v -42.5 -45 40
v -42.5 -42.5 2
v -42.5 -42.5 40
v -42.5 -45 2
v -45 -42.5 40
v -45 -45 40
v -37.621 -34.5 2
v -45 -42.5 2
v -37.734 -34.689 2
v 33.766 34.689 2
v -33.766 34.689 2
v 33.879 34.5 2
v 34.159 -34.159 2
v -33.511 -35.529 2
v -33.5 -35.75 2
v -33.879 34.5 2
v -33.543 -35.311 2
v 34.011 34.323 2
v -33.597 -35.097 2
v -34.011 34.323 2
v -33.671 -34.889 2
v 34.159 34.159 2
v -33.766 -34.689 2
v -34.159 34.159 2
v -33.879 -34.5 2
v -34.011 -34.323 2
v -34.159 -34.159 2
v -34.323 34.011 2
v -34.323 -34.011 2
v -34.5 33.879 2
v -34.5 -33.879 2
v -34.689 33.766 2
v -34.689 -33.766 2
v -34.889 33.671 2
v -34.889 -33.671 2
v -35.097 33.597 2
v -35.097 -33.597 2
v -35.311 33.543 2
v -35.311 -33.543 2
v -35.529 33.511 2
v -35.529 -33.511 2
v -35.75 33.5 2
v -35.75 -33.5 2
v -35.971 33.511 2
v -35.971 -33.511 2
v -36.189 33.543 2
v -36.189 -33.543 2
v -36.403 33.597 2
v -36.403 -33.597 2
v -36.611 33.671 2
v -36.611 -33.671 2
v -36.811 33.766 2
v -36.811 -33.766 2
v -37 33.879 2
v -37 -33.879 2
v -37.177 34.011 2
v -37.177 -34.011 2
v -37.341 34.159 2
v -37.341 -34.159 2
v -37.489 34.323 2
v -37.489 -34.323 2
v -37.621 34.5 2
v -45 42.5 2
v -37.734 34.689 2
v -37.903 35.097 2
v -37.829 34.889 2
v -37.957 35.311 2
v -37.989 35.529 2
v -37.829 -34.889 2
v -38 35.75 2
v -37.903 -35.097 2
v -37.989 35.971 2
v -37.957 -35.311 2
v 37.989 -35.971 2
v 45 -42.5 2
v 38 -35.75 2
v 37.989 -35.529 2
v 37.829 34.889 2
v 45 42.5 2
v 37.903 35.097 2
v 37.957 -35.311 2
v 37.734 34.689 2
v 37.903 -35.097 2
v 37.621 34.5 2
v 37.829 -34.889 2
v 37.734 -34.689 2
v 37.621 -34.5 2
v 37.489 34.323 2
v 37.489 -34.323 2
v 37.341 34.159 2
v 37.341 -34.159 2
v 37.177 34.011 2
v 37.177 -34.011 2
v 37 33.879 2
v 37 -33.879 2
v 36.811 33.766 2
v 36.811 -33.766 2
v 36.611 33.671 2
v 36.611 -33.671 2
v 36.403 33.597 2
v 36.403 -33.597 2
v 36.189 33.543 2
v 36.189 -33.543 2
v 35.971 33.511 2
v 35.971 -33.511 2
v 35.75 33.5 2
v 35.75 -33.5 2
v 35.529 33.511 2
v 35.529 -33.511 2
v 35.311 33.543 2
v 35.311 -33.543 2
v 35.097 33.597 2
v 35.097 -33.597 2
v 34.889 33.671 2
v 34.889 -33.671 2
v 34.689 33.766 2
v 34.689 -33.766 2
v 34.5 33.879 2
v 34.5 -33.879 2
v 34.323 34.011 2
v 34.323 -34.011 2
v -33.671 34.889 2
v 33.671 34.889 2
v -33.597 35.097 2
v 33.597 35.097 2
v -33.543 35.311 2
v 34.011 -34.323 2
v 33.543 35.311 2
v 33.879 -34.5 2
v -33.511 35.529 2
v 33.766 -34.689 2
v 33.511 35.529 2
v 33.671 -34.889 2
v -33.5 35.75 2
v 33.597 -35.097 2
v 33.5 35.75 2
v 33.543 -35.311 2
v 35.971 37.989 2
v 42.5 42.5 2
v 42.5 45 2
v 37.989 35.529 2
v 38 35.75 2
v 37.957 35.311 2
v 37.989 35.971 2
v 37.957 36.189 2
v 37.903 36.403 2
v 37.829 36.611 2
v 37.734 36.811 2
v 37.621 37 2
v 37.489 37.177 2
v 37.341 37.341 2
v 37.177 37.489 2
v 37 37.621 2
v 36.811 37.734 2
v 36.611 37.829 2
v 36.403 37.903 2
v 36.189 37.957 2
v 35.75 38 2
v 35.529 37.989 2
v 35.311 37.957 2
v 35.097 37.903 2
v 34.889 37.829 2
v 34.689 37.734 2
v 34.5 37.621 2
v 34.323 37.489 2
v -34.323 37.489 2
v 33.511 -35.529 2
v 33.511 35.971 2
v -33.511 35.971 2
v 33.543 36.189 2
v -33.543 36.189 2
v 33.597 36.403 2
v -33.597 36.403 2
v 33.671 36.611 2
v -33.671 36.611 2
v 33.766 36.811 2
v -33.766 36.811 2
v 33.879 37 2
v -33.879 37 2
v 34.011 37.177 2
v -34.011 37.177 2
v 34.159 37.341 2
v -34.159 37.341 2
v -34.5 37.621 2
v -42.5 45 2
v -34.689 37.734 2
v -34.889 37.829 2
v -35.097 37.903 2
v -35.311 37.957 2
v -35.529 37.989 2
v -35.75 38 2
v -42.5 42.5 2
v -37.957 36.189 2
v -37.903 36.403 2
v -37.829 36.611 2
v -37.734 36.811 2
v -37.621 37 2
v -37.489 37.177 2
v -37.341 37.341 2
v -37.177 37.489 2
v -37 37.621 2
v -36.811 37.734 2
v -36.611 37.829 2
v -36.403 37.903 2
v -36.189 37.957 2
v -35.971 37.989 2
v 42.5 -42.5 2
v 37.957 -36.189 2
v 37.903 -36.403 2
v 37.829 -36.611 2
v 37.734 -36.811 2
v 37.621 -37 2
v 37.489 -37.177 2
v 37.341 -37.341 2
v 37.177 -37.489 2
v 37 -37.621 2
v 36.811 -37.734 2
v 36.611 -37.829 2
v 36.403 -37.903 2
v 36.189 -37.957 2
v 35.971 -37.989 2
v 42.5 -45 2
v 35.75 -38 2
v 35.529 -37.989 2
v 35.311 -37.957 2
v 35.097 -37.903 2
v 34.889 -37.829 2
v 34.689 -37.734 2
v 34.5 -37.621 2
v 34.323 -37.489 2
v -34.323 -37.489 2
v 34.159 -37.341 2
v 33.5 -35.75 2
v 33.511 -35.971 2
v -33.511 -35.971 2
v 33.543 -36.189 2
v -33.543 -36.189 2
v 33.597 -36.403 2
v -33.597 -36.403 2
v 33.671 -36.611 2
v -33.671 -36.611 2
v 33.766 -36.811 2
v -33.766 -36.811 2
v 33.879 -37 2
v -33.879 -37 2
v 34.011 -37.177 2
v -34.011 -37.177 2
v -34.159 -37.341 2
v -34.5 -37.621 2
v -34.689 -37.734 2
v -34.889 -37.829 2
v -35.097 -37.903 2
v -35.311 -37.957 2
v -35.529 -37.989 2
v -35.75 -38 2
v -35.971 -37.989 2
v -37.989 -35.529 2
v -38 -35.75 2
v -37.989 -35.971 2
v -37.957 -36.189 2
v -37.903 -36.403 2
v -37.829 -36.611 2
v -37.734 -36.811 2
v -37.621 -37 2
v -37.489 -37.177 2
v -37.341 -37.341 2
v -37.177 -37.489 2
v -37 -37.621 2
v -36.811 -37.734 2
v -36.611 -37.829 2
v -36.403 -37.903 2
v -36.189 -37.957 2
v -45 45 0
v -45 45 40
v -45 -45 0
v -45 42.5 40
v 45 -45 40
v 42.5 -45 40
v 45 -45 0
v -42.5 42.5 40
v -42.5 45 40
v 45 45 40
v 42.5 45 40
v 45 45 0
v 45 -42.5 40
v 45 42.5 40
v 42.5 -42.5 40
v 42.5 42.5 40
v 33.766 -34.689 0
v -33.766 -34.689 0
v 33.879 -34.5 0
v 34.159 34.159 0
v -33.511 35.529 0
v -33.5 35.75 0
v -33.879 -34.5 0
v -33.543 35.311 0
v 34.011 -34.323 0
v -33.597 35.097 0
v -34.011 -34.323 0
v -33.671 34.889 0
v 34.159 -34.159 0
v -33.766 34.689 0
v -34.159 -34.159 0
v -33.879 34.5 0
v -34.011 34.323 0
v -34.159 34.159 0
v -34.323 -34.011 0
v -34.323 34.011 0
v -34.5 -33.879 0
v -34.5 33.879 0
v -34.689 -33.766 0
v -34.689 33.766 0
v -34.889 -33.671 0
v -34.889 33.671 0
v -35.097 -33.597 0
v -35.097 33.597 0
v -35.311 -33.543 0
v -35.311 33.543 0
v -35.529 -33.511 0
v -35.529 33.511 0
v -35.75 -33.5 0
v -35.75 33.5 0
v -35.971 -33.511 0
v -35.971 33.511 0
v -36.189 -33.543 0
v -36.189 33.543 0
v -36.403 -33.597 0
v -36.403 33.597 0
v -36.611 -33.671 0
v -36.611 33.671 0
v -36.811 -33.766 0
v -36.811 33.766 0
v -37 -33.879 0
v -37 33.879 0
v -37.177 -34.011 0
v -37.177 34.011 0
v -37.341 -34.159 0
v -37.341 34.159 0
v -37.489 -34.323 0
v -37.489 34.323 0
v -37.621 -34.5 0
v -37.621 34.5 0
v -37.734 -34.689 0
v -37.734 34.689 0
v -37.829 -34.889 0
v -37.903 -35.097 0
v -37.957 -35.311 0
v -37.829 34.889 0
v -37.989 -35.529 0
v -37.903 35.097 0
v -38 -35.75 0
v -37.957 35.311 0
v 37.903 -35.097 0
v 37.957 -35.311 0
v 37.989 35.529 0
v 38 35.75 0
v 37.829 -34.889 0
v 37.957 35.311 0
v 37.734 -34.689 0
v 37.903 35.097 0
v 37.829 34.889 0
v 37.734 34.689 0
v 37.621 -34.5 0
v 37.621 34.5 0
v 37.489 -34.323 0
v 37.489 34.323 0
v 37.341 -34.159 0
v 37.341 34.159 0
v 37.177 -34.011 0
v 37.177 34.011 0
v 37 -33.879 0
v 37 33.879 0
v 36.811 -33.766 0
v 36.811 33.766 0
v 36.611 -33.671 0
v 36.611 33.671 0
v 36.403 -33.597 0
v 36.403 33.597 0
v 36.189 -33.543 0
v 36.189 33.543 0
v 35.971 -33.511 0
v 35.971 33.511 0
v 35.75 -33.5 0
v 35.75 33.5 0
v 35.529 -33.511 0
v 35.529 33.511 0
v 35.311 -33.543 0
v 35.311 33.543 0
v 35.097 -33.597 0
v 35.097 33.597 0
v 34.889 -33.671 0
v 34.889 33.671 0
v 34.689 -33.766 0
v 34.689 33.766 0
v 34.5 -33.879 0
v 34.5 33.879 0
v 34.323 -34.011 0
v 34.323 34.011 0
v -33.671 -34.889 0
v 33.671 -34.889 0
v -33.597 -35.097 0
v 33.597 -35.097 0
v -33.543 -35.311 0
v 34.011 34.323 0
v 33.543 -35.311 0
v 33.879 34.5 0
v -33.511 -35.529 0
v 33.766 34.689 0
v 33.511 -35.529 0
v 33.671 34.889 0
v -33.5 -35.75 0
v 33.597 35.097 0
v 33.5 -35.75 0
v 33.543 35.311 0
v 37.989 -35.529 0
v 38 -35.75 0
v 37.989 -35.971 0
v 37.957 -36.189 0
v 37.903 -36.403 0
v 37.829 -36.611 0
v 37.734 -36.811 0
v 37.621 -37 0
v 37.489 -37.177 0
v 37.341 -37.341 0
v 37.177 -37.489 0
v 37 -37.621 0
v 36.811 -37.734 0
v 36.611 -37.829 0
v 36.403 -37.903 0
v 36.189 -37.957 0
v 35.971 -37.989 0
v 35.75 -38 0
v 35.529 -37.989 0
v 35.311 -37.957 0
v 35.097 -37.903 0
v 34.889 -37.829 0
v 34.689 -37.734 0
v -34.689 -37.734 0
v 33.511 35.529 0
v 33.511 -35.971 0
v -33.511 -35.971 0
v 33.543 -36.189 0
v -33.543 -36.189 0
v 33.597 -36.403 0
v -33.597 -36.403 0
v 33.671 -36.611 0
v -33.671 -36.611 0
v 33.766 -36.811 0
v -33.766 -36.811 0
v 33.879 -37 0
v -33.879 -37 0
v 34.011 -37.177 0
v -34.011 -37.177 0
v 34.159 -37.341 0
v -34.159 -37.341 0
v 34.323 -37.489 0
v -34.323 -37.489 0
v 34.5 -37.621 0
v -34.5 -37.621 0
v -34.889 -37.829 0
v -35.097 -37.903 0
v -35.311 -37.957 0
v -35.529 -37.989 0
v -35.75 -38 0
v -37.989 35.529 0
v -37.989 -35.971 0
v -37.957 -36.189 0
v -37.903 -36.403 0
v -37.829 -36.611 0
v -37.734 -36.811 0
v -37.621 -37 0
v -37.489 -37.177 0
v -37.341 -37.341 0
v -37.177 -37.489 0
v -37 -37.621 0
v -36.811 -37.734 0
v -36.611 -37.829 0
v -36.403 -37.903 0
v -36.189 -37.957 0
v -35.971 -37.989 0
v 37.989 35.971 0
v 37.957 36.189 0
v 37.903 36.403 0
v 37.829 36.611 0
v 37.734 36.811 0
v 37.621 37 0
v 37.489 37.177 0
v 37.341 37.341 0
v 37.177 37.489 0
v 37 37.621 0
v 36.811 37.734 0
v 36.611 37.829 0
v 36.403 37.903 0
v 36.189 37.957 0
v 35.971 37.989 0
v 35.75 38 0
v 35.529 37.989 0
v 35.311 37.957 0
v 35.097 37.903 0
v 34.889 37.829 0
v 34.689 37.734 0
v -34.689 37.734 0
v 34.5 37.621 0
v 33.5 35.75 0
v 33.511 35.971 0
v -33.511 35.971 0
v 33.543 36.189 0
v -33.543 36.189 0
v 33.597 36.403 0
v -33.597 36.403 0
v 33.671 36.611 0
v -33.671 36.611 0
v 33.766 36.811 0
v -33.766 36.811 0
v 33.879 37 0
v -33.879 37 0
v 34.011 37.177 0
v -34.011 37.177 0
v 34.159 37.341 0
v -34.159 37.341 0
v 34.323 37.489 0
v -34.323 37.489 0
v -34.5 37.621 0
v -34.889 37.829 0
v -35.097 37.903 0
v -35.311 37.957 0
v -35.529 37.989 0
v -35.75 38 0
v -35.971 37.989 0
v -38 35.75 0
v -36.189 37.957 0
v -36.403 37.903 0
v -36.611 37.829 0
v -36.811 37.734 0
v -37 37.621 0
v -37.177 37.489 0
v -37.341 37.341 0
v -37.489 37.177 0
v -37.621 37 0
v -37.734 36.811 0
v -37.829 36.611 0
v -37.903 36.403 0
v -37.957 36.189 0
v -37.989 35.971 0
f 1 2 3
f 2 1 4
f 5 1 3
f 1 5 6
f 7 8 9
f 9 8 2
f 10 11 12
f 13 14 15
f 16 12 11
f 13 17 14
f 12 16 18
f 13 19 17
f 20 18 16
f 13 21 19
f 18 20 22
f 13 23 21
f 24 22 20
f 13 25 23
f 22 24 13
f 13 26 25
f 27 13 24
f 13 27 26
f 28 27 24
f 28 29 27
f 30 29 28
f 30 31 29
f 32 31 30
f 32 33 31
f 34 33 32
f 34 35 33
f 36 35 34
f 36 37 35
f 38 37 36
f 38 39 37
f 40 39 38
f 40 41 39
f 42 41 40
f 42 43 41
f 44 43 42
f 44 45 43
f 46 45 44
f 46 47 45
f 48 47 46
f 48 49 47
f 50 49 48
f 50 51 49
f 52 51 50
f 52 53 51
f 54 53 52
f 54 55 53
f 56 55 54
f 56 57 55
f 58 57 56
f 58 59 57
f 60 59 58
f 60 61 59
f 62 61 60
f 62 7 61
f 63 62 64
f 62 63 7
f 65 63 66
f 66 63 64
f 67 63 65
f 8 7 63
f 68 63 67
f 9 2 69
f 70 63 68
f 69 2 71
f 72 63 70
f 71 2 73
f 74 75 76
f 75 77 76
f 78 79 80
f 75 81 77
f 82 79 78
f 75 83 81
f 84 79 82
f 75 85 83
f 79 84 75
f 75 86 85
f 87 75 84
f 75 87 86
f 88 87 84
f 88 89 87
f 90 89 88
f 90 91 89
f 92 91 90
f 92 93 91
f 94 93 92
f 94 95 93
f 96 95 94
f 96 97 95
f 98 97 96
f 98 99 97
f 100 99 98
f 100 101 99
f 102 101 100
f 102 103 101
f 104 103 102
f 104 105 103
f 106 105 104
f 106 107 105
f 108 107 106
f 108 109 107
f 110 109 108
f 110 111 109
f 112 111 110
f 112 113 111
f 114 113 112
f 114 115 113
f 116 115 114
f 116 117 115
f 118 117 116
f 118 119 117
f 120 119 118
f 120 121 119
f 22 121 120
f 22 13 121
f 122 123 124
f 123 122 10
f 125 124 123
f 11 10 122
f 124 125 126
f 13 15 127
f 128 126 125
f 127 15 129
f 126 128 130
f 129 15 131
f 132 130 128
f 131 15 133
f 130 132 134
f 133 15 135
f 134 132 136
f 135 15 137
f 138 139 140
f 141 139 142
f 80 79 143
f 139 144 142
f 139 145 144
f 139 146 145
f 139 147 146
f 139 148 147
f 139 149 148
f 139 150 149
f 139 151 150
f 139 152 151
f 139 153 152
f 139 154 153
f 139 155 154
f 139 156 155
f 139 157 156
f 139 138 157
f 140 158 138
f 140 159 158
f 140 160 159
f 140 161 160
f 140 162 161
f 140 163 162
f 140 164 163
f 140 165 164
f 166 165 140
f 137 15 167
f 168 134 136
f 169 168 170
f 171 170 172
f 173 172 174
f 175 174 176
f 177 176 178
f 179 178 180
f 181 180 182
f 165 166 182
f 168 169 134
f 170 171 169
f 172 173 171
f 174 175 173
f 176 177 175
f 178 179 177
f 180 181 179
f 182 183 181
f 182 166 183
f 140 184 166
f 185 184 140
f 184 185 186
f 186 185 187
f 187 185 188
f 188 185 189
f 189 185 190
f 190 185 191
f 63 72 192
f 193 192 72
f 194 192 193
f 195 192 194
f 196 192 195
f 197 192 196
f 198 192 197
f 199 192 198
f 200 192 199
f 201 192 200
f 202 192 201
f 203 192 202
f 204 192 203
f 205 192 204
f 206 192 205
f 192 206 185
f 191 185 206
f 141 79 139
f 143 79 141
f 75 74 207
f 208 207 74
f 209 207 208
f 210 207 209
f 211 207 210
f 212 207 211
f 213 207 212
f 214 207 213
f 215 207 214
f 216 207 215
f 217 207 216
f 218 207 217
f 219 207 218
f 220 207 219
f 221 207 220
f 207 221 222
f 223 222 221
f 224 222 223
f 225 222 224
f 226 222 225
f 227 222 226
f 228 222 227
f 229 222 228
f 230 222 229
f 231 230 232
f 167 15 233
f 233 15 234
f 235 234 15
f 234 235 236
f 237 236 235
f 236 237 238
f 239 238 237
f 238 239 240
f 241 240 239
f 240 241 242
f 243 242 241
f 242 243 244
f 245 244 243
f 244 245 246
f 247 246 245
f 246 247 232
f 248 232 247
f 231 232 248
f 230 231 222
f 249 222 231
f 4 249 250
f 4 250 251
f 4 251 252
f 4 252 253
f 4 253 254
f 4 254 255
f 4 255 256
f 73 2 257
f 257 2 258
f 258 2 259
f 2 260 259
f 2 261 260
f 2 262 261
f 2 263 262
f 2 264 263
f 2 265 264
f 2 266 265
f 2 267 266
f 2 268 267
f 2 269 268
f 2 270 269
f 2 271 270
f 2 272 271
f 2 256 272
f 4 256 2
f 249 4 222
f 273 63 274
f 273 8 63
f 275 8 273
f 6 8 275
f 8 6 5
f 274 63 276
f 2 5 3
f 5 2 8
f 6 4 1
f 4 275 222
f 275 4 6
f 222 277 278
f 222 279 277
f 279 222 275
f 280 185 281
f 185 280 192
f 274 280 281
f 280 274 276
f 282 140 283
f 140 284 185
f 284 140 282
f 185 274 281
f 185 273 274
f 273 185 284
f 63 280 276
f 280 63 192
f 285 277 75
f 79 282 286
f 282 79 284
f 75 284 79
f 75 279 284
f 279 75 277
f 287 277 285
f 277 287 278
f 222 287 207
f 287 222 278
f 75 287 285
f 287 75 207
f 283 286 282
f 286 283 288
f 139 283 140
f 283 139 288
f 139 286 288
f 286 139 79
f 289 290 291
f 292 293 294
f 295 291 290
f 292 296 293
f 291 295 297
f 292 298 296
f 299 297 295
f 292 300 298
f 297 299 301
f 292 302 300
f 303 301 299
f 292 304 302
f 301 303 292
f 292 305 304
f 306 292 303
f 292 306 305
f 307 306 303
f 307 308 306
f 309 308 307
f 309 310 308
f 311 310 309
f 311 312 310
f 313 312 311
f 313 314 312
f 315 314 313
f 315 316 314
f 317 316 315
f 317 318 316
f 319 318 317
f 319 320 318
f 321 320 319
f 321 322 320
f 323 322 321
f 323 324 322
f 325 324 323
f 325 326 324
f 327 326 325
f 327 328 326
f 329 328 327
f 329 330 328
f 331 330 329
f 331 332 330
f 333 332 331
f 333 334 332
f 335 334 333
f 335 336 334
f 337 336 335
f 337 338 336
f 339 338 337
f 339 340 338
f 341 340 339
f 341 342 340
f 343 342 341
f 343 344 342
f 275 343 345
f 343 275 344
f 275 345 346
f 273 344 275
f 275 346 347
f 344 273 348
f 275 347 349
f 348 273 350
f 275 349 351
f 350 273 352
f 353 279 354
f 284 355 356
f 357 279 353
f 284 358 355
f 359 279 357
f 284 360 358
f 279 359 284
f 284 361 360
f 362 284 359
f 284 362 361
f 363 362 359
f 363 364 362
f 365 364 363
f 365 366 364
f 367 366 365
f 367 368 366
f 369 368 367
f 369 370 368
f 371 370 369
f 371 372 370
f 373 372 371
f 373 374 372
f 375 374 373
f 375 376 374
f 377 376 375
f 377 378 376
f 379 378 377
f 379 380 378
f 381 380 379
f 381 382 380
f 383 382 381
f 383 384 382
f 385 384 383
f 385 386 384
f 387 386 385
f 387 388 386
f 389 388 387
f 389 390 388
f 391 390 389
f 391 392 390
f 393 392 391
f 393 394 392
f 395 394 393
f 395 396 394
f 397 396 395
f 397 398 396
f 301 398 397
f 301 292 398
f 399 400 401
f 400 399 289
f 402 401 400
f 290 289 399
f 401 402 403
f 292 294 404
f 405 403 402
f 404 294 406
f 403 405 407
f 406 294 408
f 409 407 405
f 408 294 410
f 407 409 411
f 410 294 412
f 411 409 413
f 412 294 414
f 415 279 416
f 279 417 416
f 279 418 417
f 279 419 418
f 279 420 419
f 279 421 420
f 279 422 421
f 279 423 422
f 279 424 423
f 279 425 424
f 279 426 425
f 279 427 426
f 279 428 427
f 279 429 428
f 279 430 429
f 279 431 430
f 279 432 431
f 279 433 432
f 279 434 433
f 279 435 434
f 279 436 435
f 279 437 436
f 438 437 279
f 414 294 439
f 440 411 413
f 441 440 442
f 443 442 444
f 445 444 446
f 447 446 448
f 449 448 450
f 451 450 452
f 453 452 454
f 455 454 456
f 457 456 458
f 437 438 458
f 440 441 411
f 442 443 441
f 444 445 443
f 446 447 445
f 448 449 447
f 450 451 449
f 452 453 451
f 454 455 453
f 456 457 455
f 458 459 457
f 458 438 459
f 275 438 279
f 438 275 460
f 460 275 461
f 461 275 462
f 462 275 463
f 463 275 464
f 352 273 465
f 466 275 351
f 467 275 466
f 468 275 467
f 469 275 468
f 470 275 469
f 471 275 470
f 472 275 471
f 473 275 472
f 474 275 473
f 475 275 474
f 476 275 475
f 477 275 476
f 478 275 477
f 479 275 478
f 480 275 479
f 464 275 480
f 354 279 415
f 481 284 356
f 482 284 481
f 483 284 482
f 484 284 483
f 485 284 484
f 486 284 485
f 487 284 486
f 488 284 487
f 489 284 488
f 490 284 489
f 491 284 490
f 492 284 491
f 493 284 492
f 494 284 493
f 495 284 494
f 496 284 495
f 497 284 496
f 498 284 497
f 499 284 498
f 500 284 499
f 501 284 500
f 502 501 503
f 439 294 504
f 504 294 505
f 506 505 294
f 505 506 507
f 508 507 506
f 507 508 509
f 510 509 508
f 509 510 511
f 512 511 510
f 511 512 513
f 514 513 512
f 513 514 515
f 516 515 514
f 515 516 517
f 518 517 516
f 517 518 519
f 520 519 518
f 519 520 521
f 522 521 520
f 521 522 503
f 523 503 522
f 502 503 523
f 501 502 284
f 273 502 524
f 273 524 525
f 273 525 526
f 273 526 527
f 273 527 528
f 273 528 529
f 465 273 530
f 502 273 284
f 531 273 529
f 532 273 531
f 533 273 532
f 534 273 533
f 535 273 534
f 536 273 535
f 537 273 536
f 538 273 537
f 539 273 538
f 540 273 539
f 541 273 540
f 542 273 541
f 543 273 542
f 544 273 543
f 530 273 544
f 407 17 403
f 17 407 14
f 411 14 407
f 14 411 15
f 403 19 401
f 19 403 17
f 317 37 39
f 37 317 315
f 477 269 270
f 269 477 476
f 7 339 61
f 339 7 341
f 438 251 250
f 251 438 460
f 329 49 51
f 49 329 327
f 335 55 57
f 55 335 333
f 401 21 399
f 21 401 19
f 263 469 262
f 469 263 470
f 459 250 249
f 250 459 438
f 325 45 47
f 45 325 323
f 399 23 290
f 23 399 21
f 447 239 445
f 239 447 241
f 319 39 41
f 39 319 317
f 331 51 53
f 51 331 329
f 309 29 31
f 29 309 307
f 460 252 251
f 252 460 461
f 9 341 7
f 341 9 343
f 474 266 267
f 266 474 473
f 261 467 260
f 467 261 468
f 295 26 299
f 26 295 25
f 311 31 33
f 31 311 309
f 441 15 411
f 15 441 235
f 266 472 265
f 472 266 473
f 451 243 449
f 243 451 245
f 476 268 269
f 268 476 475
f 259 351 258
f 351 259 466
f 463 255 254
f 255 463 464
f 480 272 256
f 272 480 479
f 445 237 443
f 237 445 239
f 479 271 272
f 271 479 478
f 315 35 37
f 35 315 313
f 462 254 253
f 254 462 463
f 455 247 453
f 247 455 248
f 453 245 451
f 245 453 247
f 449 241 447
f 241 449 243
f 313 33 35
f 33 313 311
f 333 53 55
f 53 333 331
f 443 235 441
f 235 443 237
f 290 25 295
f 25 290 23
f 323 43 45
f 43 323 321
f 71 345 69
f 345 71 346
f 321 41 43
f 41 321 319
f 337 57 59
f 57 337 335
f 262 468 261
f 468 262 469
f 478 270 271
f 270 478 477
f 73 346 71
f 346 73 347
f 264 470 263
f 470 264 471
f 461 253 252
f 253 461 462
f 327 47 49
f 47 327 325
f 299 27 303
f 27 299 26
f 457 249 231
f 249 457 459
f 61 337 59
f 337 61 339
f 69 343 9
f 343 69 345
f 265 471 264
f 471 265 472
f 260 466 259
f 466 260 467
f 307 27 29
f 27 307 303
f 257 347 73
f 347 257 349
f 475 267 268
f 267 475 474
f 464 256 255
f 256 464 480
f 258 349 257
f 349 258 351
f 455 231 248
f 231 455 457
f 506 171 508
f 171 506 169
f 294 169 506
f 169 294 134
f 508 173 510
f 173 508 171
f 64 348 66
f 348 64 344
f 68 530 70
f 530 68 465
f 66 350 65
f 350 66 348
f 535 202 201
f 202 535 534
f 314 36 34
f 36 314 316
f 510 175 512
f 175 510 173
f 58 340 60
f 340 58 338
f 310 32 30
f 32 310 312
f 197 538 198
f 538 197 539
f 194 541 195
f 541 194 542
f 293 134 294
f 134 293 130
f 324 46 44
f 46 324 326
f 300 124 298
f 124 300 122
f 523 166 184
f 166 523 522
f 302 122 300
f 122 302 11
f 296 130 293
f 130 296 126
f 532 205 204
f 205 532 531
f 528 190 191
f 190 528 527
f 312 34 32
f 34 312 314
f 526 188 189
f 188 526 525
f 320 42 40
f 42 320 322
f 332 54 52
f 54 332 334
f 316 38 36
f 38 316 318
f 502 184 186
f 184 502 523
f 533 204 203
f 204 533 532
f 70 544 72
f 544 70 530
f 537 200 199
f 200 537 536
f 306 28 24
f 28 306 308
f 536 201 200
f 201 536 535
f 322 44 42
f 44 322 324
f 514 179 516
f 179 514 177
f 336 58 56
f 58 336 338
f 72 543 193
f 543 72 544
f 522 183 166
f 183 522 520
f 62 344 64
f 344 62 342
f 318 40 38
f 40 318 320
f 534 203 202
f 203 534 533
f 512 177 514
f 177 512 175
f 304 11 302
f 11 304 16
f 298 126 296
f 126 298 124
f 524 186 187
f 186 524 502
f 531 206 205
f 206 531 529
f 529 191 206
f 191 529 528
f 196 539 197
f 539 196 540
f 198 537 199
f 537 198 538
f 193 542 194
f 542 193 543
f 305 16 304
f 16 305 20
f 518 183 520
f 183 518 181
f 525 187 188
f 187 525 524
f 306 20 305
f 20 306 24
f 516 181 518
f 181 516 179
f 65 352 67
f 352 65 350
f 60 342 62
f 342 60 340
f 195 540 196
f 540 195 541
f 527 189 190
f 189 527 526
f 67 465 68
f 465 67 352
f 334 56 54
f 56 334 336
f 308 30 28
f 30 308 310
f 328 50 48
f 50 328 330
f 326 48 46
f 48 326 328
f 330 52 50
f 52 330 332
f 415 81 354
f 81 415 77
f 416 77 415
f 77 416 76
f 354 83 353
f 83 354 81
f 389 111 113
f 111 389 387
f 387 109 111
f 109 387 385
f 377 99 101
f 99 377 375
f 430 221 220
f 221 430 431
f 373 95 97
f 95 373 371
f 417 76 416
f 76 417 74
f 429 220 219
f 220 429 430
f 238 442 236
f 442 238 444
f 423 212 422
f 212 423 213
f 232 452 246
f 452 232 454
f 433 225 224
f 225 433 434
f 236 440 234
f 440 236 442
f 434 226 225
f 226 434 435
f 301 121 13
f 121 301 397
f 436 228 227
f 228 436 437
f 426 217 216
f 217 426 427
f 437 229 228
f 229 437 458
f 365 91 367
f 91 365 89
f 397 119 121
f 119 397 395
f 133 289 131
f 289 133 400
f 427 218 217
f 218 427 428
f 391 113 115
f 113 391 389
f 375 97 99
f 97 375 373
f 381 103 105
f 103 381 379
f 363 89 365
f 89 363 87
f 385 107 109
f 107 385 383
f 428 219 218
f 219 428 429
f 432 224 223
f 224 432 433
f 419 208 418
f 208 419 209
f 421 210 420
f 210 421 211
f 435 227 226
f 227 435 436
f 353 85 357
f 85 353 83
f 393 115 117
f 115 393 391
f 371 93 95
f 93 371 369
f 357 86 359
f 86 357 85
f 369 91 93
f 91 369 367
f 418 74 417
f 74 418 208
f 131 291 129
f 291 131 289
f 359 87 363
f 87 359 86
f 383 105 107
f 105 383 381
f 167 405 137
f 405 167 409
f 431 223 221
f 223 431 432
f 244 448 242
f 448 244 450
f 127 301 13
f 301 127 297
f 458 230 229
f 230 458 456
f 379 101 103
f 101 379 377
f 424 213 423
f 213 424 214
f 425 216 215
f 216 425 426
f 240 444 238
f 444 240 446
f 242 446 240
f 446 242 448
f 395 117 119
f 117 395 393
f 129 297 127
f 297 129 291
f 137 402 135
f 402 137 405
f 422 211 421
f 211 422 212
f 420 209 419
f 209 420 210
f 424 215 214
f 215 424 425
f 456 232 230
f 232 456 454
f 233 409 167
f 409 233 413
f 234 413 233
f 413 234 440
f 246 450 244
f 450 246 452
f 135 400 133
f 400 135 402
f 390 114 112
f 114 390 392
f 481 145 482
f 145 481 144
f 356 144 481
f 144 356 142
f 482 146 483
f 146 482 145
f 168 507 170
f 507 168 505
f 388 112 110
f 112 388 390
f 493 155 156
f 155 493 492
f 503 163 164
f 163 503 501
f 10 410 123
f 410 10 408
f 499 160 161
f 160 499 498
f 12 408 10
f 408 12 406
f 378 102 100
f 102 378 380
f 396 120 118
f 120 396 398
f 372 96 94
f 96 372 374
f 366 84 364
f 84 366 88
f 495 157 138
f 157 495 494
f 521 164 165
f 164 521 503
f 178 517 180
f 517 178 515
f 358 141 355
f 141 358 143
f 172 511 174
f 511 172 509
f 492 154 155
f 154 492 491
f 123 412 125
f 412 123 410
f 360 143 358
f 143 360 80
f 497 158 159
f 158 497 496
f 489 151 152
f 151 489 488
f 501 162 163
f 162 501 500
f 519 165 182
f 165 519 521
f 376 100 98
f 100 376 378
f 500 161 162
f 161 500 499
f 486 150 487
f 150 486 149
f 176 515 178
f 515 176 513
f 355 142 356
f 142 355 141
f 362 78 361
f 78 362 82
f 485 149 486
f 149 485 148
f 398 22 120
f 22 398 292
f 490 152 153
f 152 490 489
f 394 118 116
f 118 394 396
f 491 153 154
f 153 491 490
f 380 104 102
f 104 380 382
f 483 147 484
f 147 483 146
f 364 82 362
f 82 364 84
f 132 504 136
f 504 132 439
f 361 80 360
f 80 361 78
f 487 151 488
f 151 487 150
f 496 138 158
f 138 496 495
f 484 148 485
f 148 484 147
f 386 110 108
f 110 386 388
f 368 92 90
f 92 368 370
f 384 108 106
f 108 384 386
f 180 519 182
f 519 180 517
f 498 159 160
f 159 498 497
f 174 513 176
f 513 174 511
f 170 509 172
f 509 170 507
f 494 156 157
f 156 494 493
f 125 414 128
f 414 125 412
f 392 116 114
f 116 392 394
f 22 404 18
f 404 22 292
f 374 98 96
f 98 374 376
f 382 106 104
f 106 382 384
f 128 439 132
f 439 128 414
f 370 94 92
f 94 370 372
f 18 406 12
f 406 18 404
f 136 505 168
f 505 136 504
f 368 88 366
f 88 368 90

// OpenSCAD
// DIY magnetic stirrer housing for 80 mm PC case fan
// Print orientation: top plate on bed (z = 0), walls build upward (+Z)

$fn = 64;

// ---- Dimensions (mm) ----
plate_thickness   = 2;     // top plate thickness (z = 0 to 2)
wall_thickness    = 2.5;   // side walls thickness
box_height        = 40;    // outer wall height (top of walls at z = 40)
outer_size        = 90;    // outer X and Y size of box
hole_size         = 4.5;   // M4 screw holes diameter
hole_pattern      = 71.5;  // square pitch of screw holes (centre to centre)
cable_notch_w     = 12;    // power cable notch width
cable_notch_depth = 8;     // notch depth from open edge (z = 32 to 40)
eps               = 0.5;   // cutter overshoot past faces

// ---- Model ----
difference() {
    union() {
        // Top plate
        translate([-outer_size/2, -outer_size/2, 0])
            cube([outer_size, outer_size, plate_thickness]);

        // Four side walls, rising from top plate to z = box_height
        for (sx = [-1, 1], sy = [-1, 1]) {
            translate([sx > 0 ? outer_size/2 - wall_thickness : -outer_size/2,
                       sy > 0 ? outer_size/2 - wall_thickness : -outer_size/2,
                       plate_thickness])
                cube([wall_thickness, wall_thickness, box_height - plate_thickness]);
        }
    }

    // Screw holes through top plate on 71.5 mm square pattern
    for (x = [-hole_pattern/2, hole_pattern/2])
        for (y = [-hole_pattern/2, hole_pattern/2])
            translate([x, y, -eps])
                cylinder(d = hole_size, h = plate_thickness + 2*eps);

    // Cable notch in one wall: 12 mm wide, centred along wall,
    // from z = 32 to z = 40 (open edge is at z = box_height)
    translate([-outer_size/2 - eps, -cable_notch_w/2, box_height - cable_notch_depth])
        cube([cable_notch_w + 2*eps, wall_thickness, cable_notch_depth + eps]);
}
